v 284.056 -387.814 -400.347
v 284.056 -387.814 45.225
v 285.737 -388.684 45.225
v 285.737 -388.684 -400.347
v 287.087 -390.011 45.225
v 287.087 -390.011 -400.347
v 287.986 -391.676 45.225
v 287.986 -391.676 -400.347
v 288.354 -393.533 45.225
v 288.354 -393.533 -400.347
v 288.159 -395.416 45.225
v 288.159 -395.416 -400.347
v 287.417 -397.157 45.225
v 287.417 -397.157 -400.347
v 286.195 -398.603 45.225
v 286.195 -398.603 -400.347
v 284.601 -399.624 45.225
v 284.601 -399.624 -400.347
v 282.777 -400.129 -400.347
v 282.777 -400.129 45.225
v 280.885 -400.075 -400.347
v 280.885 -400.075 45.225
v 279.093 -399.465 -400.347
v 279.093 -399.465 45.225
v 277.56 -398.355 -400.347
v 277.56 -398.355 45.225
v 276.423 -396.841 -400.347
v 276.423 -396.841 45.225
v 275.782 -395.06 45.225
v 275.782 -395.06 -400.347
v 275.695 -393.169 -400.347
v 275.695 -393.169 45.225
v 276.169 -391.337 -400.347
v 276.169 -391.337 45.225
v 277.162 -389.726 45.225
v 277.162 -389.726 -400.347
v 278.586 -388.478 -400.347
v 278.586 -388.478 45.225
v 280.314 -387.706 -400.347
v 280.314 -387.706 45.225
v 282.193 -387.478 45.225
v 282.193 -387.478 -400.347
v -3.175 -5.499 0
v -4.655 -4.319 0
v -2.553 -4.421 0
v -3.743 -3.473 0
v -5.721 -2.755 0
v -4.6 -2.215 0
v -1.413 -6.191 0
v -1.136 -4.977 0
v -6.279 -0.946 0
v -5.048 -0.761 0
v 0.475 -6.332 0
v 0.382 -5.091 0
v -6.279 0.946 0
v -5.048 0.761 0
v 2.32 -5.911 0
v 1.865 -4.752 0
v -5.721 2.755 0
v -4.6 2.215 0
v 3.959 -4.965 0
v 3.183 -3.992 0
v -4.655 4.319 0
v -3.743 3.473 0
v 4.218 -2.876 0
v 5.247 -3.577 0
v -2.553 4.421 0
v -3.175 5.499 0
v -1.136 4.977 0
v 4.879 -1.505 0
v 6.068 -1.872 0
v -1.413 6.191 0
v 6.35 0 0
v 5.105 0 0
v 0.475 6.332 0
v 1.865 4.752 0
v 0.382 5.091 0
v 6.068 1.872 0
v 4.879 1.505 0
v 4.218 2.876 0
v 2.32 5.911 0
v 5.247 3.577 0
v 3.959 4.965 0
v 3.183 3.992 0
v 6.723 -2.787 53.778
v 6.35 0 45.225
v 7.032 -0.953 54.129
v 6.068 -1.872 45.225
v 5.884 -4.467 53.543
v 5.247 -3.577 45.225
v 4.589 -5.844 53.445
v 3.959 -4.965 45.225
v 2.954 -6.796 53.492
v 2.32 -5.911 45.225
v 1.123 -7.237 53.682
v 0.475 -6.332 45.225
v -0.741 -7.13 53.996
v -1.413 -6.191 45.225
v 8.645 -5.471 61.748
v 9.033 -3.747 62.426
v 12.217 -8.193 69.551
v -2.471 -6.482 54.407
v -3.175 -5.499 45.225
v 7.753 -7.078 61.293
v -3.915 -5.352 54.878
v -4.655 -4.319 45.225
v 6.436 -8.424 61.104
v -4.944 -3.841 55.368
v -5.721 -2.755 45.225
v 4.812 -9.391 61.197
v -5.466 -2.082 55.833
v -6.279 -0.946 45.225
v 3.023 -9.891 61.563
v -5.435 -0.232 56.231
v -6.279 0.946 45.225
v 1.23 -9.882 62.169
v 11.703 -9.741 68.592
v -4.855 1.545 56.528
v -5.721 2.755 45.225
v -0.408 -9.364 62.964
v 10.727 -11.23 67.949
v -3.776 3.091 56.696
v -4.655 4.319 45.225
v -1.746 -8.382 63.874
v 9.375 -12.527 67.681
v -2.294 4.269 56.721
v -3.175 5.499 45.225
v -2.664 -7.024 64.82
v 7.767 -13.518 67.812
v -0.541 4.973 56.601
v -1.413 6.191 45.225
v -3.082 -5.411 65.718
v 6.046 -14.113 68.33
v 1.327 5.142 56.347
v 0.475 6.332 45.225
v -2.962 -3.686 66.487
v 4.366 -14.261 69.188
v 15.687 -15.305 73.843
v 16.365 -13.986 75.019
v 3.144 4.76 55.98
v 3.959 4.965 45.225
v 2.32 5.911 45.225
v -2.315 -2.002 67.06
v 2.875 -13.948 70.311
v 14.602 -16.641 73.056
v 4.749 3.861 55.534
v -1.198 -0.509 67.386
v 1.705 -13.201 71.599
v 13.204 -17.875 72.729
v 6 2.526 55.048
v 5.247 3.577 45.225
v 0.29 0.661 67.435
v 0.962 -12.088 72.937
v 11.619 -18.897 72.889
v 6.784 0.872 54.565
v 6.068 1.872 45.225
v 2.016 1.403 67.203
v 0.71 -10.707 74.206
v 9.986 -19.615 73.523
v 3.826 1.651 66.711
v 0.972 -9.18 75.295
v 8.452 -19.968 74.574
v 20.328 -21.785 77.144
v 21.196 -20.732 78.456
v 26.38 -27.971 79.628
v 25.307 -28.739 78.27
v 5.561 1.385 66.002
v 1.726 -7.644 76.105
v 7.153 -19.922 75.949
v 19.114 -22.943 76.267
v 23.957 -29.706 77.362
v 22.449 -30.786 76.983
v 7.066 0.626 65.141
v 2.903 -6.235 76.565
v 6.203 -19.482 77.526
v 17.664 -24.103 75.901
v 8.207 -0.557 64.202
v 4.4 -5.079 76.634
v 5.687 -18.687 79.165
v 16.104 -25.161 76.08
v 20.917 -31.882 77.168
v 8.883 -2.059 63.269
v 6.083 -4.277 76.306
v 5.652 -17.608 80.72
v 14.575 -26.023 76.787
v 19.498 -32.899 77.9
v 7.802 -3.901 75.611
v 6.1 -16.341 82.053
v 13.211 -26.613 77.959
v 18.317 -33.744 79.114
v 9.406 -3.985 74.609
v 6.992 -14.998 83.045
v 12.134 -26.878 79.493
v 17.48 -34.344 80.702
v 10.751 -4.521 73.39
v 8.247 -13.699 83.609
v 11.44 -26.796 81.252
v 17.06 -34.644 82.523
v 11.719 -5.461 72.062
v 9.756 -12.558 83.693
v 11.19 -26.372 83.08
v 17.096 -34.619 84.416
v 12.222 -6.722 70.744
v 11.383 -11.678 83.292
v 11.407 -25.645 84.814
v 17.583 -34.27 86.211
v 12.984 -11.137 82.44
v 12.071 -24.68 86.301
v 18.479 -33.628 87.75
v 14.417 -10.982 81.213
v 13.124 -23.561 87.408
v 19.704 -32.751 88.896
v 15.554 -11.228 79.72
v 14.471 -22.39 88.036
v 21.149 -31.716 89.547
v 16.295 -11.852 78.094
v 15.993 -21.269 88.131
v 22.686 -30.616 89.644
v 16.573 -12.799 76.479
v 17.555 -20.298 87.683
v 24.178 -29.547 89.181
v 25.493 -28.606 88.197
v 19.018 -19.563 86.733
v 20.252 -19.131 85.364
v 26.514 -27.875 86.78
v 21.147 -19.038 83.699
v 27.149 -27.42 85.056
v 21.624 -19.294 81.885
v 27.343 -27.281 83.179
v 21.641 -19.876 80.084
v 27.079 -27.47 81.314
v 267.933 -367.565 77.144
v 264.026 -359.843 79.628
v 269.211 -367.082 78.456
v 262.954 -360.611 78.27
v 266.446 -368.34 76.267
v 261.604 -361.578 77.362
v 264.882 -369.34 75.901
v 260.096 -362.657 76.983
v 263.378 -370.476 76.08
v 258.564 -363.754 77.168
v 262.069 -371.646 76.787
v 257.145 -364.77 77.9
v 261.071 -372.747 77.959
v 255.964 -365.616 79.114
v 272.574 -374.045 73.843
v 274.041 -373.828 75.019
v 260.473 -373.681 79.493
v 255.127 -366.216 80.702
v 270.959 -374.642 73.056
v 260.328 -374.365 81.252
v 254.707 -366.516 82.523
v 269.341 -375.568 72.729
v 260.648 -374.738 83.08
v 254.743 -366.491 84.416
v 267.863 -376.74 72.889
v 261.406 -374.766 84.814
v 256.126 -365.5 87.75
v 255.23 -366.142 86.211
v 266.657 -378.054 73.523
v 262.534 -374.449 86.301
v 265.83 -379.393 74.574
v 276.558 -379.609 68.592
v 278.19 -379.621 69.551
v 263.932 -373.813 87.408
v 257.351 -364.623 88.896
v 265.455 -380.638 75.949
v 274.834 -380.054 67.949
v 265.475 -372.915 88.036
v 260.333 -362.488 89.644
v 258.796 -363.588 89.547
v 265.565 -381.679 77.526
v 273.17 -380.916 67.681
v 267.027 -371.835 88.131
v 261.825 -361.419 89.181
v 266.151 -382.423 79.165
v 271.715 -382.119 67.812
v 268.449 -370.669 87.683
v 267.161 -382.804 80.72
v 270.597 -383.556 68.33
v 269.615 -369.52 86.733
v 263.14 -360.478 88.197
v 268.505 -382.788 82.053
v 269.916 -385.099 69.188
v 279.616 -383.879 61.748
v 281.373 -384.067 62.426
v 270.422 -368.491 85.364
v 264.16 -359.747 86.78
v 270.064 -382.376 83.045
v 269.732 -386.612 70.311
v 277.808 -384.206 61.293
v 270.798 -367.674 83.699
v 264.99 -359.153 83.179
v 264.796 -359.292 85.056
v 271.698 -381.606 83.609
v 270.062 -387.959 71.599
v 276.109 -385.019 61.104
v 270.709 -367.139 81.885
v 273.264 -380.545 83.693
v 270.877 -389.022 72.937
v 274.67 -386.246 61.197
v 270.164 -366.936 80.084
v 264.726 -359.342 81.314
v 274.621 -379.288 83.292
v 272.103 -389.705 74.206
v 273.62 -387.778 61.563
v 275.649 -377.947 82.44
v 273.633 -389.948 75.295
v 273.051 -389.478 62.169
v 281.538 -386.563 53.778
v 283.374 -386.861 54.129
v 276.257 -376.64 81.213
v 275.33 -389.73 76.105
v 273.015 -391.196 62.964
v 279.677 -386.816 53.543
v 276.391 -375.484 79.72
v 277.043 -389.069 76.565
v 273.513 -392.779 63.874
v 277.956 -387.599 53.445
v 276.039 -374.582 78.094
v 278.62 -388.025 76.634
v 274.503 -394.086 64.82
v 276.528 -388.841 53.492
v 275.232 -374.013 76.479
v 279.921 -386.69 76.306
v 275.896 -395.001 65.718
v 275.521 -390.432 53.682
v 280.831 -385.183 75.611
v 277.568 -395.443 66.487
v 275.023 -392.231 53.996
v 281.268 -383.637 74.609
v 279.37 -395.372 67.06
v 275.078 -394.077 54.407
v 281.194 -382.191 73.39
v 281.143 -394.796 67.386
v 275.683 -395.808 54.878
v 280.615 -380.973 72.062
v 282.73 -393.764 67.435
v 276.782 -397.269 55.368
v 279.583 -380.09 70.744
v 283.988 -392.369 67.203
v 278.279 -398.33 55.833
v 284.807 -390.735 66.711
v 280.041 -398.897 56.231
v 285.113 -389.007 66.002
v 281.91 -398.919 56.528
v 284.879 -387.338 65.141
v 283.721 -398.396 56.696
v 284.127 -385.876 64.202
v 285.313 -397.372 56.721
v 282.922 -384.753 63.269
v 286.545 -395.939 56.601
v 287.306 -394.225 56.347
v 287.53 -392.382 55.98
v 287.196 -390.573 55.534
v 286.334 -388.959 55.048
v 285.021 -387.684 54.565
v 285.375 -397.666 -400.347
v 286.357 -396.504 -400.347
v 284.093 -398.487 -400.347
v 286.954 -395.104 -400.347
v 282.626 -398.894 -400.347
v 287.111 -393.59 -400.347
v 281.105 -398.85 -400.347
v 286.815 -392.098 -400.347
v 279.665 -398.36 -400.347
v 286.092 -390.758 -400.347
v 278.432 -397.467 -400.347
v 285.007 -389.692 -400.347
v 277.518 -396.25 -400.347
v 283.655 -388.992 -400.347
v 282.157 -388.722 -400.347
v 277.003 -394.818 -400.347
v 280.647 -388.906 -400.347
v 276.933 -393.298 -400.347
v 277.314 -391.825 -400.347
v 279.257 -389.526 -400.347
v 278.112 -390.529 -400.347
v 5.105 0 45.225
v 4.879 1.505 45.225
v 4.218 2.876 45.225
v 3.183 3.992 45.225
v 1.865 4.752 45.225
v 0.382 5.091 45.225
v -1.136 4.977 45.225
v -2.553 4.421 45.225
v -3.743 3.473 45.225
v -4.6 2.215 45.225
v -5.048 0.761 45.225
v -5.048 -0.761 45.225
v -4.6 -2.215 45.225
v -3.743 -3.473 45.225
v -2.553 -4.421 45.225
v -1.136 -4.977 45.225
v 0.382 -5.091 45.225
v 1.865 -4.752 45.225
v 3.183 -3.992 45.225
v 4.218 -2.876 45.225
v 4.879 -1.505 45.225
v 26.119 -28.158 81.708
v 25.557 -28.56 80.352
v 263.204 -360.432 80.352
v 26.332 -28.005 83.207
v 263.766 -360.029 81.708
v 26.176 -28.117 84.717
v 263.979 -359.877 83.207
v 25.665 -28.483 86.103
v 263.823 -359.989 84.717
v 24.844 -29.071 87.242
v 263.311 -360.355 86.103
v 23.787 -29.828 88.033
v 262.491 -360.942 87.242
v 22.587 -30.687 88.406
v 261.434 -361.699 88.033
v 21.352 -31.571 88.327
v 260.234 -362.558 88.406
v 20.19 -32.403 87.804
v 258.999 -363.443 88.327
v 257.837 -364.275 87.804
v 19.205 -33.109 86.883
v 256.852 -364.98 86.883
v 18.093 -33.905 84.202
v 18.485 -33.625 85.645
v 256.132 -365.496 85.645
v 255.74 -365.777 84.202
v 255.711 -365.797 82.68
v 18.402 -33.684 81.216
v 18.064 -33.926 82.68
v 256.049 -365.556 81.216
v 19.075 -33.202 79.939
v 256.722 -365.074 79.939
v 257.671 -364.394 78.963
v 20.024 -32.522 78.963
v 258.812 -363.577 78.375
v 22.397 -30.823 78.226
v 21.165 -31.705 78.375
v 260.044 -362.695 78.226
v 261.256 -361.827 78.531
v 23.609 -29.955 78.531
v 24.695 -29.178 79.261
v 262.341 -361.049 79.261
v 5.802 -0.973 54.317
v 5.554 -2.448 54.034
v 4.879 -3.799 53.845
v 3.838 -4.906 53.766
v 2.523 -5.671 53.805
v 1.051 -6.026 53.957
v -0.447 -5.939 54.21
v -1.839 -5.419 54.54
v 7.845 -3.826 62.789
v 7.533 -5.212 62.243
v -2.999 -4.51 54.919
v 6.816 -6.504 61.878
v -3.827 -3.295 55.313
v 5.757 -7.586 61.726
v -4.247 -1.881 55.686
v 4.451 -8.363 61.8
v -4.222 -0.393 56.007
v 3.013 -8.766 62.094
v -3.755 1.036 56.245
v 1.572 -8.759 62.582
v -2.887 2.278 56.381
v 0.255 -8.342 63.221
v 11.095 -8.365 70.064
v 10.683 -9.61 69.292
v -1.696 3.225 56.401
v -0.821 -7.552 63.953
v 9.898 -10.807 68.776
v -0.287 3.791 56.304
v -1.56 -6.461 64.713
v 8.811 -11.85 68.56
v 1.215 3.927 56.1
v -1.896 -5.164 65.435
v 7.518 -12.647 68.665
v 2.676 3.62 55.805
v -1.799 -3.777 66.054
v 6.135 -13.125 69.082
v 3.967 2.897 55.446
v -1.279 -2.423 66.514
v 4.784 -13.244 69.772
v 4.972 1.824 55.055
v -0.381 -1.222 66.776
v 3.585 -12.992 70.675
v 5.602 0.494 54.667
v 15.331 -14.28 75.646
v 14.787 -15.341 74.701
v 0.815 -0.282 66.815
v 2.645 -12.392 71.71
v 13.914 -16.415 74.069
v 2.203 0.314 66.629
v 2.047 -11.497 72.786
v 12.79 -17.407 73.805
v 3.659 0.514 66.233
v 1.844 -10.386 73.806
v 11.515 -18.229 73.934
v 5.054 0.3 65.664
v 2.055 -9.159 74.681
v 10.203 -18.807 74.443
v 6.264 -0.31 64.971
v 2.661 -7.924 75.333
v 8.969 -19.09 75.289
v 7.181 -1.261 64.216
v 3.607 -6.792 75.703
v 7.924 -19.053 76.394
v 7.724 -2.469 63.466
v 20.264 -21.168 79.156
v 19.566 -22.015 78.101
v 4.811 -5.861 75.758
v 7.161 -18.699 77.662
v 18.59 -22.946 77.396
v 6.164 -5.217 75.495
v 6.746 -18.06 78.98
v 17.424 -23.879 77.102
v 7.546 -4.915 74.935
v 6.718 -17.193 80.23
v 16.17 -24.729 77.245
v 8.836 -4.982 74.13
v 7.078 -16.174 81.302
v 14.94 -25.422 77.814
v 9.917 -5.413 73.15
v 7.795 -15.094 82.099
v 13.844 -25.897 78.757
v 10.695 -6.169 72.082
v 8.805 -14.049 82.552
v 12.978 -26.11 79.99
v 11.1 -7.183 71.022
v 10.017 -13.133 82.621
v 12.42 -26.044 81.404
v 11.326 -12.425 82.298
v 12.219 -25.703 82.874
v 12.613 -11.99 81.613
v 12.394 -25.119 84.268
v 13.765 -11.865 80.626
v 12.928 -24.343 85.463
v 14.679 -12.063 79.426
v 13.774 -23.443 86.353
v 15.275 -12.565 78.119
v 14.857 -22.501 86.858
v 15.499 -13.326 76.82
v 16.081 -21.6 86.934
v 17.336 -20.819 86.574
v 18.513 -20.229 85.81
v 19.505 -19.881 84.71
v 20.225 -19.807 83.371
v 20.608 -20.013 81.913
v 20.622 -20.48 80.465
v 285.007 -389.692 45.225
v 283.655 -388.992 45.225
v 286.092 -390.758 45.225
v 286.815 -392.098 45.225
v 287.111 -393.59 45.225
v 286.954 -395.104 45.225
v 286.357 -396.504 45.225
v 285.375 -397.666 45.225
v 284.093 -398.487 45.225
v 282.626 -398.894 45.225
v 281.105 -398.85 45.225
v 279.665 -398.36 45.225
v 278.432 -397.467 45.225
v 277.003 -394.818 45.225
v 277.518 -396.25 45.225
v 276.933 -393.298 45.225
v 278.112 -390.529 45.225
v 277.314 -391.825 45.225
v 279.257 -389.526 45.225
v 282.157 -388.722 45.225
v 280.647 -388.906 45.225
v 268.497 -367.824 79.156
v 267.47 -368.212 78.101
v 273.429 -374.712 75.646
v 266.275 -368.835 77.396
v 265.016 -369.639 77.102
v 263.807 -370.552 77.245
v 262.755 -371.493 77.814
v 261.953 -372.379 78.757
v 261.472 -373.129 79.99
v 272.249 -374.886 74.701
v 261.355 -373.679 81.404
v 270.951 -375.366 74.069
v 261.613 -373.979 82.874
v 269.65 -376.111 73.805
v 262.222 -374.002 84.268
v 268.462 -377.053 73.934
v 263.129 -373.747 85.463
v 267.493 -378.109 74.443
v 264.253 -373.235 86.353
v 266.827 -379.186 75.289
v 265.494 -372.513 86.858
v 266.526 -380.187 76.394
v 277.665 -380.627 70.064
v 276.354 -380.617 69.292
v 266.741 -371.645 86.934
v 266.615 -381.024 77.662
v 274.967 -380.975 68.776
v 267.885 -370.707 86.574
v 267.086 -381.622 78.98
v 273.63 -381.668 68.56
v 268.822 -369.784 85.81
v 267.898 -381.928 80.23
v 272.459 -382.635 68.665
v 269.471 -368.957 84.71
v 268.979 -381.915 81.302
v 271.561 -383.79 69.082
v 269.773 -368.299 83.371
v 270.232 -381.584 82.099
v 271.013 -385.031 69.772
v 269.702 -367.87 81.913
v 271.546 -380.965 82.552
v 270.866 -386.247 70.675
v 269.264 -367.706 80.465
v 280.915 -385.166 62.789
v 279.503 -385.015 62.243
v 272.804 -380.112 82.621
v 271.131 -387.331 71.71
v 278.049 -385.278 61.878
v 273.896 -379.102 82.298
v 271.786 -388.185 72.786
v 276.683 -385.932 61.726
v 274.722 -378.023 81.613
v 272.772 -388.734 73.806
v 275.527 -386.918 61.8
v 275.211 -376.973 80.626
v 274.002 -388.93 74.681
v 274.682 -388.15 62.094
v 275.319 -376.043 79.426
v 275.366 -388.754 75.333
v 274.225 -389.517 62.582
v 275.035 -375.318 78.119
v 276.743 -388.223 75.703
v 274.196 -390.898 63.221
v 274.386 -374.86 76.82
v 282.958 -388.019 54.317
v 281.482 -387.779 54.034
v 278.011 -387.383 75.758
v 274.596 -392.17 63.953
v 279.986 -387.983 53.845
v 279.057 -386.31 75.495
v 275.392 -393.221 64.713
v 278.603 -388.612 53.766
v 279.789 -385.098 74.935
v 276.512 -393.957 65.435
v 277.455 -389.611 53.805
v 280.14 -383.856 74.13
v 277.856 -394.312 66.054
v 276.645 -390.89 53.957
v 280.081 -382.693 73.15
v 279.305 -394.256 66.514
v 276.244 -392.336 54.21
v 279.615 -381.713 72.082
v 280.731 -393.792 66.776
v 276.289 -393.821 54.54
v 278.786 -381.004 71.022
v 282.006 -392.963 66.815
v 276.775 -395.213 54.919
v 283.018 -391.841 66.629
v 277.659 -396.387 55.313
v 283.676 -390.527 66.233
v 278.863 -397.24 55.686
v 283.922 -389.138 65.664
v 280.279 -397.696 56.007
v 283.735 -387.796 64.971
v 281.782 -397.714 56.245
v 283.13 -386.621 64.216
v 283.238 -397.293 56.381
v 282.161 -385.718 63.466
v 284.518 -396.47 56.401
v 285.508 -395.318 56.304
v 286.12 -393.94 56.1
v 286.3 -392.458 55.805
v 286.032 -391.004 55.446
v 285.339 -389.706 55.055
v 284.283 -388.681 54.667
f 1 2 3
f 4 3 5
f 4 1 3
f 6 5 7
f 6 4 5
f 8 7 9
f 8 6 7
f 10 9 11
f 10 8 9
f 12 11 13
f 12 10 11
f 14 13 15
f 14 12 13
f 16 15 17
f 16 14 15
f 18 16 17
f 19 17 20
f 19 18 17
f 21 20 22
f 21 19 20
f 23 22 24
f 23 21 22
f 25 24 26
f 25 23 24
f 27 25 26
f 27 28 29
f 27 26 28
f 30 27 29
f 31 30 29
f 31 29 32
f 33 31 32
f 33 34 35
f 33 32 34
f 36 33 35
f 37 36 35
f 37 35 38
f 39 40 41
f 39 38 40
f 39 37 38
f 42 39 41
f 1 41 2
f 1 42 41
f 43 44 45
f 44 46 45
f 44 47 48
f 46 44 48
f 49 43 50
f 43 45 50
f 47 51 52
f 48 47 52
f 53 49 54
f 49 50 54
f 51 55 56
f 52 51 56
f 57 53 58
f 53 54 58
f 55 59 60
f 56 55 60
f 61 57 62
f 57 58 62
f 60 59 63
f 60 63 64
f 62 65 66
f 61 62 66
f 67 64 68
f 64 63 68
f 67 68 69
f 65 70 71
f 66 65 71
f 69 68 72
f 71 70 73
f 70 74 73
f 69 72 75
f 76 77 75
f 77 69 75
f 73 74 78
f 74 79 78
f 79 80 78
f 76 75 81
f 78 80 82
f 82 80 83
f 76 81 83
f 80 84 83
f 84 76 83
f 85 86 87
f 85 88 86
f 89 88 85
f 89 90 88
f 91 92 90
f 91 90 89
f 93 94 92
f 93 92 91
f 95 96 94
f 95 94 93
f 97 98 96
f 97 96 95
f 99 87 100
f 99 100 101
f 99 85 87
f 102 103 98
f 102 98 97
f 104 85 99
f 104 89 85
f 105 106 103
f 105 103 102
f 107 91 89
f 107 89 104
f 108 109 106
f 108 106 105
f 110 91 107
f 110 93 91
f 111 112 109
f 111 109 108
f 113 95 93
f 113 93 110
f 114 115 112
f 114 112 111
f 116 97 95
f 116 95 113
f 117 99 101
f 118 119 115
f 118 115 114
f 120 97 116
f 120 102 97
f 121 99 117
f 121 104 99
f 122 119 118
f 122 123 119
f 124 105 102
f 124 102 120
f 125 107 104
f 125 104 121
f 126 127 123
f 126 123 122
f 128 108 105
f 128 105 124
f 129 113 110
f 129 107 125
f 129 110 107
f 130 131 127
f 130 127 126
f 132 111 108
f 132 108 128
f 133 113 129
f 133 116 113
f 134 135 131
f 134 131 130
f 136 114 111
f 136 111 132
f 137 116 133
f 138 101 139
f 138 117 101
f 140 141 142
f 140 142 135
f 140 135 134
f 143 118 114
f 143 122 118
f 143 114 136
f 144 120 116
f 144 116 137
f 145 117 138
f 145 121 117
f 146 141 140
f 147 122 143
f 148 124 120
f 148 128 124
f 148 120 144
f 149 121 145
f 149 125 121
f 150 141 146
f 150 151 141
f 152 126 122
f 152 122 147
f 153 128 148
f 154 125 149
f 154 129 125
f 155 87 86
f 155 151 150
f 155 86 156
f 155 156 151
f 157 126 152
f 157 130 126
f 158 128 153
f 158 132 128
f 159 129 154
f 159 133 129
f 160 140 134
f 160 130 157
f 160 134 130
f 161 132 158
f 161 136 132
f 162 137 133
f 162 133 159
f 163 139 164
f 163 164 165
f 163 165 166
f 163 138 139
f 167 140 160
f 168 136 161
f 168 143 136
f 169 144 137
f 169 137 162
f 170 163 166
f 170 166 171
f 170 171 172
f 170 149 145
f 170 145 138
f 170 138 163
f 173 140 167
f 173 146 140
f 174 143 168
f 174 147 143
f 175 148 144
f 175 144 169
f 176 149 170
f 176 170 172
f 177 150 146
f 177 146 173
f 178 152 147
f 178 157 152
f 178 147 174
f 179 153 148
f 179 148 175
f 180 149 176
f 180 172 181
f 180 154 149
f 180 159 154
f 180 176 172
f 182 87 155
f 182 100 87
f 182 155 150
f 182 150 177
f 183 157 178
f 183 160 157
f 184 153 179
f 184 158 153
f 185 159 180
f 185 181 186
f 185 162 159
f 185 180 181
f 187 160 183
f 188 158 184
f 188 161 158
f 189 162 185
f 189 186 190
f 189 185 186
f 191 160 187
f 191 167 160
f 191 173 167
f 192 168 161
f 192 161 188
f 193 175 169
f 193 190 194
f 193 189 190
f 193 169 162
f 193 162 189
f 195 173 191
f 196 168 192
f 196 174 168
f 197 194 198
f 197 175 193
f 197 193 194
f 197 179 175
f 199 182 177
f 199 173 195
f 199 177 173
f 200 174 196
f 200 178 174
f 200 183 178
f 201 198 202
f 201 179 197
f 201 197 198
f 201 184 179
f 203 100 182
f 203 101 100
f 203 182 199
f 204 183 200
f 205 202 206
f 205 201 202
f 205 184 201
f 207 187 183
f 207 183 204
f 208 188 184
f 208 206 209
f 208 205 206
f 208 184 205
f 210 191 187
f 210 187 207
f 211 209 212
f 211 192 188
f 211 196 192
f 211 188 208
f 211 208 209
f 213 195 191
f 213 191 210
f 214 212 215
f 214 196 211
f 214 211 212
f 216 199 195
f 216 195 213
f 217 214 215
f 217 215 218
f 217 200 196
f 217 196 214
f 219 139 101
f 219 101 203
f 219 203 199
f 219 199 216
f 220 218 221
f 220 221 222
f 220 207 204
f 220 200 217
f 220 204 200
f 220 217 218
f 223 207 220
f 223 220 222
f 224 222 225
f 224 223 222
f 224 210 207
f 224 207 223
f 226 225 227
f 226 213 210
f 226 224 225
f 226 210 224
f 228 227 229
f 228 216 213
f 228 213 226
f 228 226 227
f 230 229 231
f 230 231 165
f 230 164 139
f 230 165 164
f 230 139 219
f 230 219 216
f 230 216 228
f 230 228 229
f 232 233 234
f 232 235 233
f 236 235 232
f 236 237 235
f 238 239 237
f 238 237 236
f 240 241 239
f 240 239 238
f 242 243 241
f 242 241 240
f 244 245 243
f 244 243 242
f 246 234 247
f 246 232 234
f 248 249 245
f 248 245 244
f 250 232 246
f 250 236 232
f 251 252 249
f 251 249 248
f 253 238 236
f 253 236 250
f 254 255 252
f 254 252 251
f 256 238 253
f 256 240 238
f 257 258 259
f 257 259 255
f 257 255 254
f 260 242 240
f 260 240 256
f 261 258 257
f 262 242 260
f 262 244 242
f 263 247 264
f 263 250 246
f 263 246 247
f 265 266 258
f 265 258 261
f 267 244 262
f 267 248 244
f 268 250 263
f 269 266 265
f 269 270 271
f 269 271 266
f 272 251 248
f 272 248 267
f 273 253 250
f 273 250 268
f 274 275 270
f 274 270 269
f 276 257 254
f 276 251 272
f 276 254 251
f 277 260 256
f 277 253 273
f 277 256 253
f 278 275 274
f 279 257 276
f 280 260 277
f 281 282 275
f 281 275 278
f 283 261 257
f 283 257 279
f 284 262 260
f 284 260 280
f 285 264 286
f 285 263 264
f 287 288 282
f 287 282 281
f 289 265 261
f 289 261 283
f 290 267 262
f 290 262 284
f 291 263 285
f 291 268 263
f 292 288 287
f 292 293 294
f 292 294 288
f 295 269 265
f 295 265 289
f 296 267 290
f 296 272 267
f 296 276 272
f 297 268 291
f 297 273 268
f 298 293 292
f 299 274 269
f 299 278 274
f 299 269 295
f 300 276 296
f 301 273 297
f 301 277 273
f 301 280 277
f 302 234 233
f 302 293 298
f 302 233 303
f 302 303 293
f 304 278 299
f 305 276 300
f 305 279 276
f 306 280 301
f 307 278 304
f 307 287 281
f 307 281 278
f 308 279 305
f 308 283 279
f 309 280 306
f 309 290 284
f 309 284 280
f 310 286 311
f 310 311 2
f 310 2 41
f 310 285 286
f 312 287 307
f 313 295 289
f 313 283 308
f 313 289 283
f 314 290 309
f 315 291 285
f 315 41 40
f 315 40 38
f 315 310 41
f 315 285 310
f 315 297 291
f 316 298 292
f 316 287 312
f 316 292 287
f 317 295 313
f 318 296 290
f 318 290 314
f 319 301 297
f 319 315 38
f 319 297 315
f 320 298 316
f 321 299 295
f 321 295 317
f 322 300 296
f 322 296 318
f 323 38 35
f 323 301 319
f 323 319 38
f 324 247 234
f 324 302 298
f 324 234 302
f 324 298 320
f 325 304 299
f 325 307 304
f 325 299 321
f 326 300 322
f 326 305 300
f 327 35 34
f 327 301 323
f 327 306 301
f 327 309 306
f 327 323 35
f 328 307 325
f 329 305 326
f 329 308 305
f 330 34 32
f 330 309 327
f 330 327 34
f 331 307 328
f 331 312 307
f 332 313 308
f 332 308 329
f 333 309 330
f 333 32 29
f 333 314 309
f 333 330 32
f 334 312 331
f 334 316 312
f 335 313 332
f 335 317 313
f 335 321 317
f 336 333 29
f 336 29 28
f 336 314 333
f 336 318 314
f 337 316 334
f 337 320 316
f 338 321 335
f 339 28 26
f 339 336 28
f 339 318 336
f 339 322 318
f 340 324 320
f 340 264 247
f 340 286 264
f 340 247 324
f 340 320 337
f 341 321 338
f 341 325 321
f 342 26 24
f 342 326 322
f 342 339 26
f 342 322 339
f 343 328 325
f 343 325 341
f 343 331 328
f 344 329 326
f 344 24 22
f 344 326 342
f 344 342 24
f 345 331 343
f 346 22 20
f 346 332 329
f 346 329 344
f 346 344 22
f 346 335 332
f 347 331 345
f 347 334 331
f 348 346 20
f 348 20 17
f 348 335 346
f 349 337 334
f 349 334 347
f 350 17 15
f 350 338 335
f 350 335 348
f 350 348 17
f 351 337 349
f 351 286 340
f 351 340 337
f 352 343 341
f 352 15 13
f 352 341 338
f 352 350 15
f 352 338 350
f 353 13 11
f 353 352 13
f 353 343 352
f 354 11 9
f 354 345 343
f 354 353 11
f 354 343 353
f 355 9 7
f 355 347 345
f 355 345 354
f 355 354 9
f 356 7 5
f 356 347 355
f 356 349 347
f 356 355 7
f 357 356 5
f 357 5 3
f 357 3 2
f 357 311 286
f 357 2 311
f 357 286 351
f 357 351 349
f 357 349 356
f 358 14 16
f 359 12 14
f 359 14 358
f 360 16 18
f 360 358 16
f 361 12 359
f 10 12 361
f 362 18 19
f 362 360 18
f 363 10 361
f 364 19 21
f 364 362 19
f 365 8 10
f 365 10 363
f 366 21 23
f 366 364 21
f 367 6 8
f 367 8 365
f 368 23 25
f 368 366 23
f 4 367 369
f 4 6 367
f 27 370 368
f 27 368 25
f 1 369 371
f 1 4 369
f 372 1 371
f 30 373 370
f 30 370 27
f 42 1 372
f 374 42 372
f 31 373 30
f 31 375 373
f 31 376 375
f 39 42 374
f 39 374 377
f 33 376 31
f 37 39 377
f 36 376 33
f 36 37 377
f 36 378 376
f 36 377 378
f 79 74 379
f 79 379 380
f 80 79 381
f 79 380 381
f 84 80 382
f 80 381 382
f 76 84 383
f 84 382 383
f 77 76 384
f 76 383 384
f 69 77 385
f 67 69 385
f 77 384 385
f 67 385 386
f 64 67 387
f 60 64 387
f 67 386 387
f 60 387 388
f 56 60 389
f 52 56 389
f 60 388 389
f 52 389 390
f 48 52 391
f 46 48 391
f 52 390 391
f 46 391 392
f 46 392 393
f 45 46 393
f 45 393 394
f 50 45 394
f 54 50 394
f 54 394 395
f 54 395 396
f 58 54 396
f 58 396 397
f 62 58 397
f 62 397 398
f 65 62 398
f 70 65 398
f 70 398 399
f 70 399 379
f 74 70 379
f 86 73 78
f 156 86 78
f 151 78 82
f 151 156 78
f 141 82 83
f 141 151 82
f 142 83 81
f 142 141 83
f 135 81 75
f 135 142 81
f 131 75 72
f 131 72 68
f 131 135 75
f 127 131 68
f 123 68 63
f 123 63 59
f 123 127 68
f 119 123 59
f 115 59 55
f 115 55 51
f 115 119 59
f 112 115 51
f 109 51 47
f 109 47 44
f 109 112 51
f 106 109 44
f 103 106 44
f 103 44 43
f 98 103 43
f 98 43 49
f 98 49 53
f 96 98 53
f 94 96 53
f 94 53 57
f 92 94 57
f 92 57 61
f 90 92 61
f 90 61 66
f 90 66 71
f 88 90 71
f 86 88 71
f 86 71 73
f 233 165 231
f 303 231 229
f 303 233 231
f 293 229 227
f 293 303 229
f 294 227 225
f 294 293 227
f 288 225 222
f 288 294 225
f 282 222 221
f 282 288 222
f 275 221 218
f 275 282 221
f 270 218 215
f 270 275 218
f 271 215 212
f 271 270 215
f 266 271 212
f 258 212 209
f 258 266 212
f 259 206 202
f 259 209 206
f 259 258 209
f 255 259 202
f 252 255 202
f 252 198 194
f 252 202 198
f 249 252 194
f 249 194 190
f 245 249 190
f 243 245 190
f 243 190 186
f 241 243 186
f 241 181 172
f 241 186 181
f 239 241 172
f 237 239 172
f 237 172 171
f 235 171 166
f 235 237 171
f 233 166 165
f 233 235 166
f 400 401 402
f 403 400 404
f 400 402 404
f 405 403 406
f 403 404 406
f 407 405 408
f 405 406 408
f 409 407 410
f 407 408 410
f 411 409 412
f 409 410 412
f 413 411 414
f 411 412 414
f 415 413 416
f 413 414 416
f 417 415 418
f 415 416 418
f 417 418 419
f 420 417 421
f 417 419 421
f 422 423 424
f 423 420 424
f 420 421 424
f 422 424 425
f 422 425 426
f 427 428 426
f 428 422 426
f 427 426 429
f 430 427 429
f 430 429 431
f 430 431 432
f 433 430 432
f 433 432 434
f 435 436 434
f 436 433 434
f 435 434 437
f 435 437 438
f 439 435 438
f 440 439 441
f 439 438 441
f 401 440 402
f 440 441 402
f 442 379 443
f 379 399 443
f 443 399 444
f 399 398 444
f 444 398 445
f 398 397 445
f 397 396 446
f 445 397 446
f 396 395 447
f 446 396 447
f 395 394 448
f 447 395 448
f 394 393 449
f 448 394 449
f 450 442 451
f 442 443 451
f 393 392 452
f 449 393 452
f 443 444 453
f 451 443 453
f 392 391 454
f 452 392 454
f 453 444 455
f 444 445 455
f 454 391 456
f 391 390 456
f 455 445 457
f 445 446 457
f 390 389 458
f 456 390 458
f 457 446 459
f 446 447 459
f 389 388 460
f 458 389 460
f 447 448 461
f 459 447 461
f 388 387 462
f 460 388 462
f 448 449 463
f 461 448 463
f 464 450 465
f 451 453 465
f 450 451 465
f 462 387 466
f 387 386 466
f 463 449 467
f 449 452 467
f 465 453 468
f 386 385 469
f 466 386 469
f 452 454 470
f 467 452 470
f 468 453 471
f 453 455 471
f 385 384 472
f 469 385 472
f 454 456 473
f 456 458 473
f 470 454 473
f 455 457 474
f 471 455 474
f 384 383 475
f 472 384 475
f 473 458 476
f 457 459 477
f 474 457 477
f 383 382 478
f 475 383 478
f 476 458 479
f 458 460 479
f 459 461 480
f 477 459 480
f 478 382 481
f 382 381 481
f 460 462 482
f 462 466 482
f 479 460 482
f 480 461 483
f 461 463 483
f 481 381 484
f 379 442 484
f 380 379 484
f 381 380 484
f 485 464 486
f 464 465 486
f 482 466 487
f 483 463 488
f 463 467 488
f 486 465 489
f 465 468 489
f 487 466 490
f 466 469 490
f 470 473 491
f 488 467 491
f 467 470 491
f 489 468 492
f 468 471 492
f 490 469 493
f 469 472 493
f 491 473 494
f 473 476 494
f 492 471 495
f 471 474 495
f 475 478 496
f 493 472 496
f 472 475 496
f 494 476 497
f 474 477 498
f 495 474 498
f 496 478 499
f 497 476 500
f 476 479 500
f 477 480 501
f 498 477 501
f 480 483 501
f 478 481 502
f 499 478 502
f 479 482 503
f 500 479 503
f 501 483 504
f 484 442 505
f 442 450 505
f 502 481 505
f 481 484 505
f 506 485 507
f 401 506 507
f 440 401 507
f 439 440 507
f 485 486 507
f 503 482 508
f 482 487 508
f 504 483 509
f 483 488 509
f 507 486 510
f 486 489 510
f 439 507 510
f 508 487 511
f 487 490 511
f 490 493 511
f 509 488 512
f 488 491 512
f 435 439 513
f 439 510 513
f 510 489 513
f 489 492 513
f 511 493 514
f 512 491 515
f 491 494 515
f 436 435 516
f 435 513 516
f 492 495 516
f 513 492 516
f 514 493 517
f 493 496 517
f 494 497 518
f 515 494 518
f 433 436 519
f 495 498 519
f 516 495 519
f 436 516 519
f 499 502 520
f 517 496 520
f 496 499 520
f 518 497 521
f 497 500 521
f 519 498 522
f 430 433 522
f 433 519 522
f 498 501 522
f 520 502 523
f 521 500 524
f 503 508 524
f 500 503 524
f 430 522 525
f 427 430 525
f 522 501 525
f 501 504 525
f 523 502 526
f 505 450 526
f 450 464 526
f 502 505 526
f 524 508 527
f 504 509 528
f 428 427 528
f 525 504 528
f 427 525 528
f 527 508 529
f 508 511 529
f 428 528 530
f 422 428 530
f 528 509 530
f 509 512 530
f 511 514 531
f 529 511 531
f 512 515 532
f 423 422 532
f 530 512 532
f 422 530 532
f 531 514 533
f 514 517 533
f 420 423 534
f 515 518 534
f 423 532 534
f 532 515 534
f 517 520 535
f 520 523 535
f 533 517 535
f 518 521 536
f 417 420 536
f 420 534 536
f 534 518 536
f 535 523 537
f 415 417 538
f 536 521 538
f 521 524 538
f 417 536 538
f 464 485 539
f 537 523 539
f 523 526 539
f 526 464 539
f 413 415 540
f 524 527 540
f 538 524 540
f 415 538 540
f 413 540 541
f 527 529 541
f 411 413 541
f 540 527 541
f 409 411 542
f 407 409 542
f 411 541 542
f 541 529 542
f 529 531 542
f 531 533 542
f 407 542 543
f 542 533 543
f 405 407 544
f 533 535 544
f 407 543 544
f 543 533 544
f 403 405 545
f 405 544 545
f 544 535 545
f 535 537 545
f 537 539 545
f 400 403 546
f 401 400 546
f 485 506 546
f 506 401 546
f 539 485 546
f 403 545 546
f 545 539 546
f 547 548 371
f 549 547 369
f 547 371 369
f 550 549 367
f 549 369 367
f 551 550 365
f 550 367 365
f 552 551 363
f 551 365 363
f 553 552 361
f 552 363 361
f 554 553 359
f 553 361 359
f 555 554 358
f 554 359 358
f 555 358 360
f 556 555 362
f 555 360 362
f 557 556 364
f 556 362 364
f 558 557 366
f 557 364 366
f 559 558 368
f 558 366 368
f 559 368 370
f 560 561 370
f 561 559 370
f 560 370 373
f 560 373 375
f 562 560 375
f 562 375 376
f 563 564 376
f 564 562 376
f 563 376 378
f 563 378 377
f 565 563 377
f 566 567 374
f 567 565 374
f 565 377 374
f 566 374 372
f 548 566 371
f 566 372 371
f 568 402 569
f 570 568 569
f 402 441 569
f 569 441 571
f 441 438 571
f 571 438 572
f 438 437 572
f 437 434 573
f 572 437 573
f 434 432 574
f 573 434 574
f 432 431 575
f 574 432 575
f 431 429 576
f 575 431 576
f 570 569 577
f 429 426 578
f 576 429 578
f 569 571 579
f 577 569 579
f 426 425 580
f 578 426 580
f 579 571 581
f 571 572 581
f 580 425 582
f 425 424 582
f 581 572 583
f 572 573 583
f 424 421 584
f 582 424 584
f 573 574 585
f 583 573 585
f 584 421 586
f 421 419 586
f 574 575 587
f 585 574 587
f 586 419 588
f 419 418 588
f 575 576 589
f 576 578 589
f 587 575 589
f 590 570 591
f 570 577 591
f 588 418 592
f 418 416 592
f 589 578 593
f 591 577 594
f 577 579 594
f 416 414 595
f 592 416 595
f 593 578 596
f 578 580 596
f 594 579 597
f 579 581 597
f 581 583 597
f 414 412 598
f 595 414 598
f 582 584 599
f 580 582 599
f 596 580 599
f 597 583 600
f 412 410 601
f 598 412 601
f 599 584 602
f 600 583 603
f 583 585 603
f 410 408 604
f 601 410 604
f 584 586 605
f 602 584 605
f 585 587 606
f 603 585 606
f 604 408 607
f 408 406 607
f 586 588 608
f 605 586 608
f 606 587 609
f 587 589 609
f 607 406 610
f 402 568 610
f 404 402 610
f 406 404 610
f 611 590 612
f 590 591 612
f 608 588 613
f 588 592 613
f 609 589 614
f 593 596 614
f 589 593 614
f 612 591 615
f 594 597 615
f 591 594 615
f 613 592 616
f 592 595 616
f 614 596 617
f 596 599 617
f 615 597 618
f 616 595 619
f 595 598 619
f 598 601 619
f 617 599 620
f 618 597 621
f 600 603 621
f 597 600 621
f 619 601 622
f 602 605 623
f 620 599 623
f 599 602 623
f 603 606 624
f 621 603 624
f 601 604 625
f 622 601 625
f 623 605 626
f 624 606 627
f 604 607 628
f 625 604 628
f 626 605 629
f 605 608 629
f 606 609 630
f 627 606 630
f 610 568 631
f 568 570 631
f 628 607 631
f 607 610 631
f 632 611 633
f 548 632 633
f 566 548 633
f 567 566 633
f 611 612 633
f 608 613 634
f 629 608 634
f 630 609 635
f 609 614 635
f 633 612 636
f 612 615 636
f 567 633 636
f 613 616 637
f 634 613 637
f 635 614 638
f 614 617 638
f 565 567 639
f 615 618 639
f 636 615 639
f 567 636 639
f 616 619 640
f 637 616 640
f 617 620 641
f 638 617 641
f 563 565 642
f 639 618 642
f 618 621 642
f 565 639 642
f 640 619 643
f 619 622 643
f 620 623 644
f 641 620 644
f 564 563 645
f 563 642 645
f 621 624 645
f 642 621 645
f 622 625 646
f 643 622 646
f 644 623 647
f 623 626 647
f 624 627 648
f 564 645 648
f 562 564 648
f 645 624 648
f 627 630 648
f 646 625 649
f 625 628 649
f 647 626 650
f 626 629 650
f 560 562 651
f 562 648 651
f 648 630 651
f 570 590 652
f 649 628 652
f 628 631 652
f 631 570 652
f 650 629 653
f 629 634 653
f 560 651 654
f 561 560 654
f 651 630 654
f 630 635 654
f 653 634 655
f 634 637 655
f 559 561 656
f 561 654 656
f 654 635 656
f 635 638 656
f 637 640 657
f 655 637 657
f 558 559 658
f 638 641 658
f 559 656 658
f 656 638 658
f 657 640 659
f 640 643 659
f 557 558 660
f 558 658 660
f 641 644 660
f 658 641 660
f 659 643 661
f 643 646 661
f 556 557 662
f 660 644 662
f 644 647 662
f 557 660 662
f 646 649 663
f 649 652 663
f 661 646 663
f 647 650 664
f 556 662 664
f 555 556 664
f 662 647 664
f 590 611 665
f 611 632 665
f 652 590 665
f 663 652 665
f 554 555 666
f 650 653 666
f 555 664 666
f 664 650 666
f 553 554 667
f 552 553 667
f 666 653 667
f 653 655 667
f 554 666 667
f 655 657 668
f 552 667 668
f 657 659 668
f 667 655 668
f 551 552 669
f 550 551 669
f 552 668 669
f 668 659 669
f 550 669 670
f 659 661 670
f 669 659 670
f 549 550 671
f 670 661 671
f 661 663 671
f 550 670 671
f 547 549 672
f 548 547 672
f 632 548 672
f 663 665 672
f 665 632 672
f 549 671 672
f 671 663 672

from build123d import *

# Parameters (mm, degrees)
PIPESKETCH_R   = 6.35
PIPESKETCH_R_2 = 5.1054


with BuildPart() as part:
    # ThinSweep: sweep along a curve in space
    with BuildLine() as thinsweep_path:
        Line((0, 0, 0), (0, 0, 45.224833485))
        ThreePointArc((0, 0, 45.224833485), (6.49695017, -9.072931676, 72.165601848), (22.181975386, -30.97692638, 83.324833485))
        Line((22.181975386, -30.97692638, 83.324833485), (259.82889592, -362.848684139, 83.324833485))
        ThreePointArc((282.010871306, -393.825610519, 45.224833485), (275.513921135, -384.752678843, 72.165601848), (259.82889592, -362.848684139, 83.324833485))
        Line((282.010871306, -393.825610519, -400.347253913), (282.010871306, -393.825610519, 45.224833485))
    # PipeSketch → ThinSweep (sweep)
    with BuildSketch(Plane.XY):
        Circle(PIPESKETCH_R)
        Circle(PIPESKETCH_R_2, mode=Mode.SUBTRACT)
    sweep(path=thinsweep_path.line)


solid = part.part
